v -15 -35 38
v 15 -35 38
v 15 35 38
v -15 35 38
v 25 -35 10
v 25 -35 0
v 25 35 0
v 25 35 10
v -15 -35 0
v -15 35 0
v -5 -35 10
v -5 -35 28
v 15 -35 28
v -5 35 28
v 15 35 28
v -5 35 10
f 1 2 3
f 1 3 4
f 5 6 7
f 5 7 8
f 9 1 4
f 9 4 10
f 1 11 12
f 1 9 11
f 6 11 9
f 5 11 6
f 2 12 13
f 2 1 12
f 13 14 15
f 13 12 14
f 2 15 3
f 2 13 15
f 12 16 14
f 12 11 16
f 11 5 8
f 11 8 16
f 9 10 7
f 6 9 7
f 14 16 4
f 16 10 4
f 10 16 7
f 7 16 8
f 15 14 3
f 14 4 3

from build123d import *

# Parameters (mm, degrees)
F0_W     = 10
F0_H     = 10
F1_DEPTH = 35


with BuildPart() as f1:
    # F0 (on Front) → F1 (new body, symmetric)
    with BuildSketch(Plane.XZ):
        Polygon((15, 28), (15, 38), (-15, 38), (-15, 0), (15, 0), (15, 10), (-5, 10), (-5, 28), align=None)
        with Locations((20, 5)):
            Rectangle(F0_W, F0_H)
    extrude(amount=F1_DEPTH, both=True)


solid = f1.part
